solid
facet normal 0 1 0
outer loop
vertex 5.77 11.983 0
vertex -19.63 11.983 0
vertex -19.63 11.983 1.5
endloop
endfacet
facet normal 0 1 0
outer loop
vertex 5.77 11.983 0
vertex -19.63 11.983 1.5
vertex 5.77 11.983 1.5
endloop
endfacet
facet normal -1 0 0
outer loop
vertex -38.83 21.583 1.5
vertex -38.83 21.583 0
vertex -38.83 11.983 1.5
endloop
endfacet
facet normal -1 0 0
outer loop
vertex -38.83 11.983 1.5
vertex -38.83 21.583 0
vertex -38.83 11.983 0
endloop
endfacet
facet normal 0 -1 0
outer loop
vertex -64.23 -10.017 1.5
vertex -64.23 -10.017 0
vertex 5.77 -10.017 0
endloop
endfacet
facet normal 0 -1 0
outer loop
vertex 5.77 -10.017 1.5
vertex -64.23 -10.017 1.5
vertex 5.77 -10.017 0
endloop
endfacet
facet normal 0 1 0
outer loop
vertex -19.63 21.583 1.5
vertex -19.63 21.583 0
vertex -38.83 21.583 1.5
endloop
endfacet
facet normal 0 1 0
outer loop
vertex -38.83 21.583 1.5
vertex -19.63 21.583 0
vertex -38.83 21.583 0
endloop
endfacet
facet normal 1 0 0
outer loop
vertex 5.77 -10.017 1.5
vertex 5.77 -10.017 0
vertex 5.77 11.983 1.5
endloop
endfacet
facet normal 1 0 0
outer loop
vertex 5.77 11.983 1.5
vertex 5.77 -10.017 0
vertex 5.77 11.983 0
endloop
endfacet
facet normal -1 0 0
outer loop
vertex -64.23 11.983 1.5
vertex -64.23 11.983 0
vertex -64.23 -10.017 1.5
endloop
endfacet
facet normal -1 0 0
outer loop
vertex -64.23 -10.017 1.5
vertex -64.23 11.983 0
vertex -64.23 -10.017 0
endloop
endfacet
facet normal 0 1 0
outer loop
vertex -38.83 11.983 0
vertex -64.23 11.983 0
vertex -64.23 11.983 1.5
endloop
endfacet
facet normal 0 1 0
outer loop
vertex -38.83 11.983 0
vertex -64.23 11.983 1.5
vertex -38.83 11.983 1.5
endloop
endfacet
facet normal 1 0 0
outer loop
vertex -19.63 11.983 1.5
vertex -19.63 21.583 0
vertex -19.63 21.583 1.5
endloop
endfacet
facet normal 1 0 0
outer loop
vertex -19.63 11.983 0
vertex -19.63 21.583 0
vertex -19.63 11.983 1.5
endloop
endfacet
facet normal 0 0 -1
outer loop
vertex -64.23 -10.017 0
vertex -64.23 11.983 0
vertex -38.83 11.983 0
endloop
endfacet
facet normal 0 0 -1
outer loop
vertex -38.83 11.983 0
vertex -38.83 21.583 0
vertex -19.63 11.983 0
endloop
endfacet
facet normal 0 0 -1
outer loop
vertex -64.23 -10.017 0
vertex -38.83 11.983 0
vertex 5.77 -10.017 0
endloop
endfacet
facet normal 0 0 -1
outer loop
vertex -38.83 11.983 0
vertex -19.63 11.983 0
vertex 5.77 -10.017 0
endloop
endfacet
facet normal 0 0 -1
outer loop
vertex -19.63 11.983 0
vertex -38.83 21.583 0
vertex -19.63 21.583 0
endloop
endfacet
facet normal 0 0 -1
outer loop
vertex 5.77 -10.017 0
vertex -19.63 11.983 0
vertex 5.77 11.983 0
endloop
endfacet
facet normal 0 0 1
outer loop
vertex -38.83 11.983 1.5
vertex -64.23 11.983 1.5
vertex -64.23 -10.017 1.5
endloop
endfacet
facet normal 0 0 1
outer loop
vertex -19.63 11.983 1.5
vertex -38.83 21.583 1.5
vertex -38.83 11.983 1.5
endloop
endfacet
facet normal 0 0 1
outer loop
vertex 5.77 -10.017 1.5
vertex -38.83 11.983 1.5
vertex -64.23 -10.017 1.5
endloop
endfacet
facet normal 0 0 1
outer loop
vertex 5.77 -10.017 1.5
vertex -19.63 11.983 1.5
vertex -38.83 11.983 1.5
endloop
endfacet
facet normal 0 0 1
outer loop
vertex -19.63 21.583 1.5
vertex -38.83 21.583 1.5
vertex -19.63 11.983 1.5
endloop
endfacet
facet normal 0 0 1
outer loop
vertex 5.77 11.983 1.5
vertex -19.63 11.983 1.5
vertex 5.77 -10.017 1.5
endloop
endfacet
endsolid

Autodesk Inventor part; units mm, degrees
ref_plane "YZ Plane" through (0, 0, 0) normal (1, 0, 0) x (0, 1, 0)
ref_plane "XZ Plane" through (0, 0, 0) normal (0, 1, 0) x (-1, 0, 0)
ref_plane "XY Plane" through (0, 0, 0) normal (0, 0, 1) x (1, 0, 0)
sketch "Esboço1" plane through (0, 0, 0) normal (0, 0, 1) x (1, 0, 0)
  line L0 (1.0701, 11.9834) -> (-0.8299, 11.9834)
  line L1 (-64.2299, 11.9834) -> (-64.2299, -10.0166)
  line L2 (-64.2299, -10.0166) -> (5.7701, -10.0166)
  line L3 (5.7701, -10.0166) -> (5.7701, 11.9834)
  line L4 (-61.2299, -10.5466) -> (-61.2299, 13.5834)
  line L5 (2.7701, 57.5834) -> (2.7701, -6.4166)
  line L6 (-31.3299, 21.5834) -> (-37.5299, 21.5834)
  line L7 (5.7701, -10.0166) -> (2.8701, -10.0166)
  line L8 (-59.5299, 11.9834) -> (-57.6299, 11.9834)
  line L9 (-38.8299, 21.5834) -> (-38.8299, 12.0834)
  line L10 (-19.6299, 21.5834) -> (-19.6299, 12.0834)
  line L11 (-19.6299, 11.9834) -> (-19.6299, 21.5834)
  line L12 (-19.6299, 21.5834) -> (-38.8299, 21.5834)
  line L13 (-38.8299, 21.5834) -> (-38.8299, 11.9834)
  line L14 (-64.2299, 11.9834) -> (-38.8299, 11.9834)
  line L15 (-19.6299, 11.9834) -> (5.7701, 11.9834)
  point P0 (0, 0)
extrude "Extrusão1" add sketch "Esboço1" along normal blind 1.5
properties part number "pcb sensor de cor"
